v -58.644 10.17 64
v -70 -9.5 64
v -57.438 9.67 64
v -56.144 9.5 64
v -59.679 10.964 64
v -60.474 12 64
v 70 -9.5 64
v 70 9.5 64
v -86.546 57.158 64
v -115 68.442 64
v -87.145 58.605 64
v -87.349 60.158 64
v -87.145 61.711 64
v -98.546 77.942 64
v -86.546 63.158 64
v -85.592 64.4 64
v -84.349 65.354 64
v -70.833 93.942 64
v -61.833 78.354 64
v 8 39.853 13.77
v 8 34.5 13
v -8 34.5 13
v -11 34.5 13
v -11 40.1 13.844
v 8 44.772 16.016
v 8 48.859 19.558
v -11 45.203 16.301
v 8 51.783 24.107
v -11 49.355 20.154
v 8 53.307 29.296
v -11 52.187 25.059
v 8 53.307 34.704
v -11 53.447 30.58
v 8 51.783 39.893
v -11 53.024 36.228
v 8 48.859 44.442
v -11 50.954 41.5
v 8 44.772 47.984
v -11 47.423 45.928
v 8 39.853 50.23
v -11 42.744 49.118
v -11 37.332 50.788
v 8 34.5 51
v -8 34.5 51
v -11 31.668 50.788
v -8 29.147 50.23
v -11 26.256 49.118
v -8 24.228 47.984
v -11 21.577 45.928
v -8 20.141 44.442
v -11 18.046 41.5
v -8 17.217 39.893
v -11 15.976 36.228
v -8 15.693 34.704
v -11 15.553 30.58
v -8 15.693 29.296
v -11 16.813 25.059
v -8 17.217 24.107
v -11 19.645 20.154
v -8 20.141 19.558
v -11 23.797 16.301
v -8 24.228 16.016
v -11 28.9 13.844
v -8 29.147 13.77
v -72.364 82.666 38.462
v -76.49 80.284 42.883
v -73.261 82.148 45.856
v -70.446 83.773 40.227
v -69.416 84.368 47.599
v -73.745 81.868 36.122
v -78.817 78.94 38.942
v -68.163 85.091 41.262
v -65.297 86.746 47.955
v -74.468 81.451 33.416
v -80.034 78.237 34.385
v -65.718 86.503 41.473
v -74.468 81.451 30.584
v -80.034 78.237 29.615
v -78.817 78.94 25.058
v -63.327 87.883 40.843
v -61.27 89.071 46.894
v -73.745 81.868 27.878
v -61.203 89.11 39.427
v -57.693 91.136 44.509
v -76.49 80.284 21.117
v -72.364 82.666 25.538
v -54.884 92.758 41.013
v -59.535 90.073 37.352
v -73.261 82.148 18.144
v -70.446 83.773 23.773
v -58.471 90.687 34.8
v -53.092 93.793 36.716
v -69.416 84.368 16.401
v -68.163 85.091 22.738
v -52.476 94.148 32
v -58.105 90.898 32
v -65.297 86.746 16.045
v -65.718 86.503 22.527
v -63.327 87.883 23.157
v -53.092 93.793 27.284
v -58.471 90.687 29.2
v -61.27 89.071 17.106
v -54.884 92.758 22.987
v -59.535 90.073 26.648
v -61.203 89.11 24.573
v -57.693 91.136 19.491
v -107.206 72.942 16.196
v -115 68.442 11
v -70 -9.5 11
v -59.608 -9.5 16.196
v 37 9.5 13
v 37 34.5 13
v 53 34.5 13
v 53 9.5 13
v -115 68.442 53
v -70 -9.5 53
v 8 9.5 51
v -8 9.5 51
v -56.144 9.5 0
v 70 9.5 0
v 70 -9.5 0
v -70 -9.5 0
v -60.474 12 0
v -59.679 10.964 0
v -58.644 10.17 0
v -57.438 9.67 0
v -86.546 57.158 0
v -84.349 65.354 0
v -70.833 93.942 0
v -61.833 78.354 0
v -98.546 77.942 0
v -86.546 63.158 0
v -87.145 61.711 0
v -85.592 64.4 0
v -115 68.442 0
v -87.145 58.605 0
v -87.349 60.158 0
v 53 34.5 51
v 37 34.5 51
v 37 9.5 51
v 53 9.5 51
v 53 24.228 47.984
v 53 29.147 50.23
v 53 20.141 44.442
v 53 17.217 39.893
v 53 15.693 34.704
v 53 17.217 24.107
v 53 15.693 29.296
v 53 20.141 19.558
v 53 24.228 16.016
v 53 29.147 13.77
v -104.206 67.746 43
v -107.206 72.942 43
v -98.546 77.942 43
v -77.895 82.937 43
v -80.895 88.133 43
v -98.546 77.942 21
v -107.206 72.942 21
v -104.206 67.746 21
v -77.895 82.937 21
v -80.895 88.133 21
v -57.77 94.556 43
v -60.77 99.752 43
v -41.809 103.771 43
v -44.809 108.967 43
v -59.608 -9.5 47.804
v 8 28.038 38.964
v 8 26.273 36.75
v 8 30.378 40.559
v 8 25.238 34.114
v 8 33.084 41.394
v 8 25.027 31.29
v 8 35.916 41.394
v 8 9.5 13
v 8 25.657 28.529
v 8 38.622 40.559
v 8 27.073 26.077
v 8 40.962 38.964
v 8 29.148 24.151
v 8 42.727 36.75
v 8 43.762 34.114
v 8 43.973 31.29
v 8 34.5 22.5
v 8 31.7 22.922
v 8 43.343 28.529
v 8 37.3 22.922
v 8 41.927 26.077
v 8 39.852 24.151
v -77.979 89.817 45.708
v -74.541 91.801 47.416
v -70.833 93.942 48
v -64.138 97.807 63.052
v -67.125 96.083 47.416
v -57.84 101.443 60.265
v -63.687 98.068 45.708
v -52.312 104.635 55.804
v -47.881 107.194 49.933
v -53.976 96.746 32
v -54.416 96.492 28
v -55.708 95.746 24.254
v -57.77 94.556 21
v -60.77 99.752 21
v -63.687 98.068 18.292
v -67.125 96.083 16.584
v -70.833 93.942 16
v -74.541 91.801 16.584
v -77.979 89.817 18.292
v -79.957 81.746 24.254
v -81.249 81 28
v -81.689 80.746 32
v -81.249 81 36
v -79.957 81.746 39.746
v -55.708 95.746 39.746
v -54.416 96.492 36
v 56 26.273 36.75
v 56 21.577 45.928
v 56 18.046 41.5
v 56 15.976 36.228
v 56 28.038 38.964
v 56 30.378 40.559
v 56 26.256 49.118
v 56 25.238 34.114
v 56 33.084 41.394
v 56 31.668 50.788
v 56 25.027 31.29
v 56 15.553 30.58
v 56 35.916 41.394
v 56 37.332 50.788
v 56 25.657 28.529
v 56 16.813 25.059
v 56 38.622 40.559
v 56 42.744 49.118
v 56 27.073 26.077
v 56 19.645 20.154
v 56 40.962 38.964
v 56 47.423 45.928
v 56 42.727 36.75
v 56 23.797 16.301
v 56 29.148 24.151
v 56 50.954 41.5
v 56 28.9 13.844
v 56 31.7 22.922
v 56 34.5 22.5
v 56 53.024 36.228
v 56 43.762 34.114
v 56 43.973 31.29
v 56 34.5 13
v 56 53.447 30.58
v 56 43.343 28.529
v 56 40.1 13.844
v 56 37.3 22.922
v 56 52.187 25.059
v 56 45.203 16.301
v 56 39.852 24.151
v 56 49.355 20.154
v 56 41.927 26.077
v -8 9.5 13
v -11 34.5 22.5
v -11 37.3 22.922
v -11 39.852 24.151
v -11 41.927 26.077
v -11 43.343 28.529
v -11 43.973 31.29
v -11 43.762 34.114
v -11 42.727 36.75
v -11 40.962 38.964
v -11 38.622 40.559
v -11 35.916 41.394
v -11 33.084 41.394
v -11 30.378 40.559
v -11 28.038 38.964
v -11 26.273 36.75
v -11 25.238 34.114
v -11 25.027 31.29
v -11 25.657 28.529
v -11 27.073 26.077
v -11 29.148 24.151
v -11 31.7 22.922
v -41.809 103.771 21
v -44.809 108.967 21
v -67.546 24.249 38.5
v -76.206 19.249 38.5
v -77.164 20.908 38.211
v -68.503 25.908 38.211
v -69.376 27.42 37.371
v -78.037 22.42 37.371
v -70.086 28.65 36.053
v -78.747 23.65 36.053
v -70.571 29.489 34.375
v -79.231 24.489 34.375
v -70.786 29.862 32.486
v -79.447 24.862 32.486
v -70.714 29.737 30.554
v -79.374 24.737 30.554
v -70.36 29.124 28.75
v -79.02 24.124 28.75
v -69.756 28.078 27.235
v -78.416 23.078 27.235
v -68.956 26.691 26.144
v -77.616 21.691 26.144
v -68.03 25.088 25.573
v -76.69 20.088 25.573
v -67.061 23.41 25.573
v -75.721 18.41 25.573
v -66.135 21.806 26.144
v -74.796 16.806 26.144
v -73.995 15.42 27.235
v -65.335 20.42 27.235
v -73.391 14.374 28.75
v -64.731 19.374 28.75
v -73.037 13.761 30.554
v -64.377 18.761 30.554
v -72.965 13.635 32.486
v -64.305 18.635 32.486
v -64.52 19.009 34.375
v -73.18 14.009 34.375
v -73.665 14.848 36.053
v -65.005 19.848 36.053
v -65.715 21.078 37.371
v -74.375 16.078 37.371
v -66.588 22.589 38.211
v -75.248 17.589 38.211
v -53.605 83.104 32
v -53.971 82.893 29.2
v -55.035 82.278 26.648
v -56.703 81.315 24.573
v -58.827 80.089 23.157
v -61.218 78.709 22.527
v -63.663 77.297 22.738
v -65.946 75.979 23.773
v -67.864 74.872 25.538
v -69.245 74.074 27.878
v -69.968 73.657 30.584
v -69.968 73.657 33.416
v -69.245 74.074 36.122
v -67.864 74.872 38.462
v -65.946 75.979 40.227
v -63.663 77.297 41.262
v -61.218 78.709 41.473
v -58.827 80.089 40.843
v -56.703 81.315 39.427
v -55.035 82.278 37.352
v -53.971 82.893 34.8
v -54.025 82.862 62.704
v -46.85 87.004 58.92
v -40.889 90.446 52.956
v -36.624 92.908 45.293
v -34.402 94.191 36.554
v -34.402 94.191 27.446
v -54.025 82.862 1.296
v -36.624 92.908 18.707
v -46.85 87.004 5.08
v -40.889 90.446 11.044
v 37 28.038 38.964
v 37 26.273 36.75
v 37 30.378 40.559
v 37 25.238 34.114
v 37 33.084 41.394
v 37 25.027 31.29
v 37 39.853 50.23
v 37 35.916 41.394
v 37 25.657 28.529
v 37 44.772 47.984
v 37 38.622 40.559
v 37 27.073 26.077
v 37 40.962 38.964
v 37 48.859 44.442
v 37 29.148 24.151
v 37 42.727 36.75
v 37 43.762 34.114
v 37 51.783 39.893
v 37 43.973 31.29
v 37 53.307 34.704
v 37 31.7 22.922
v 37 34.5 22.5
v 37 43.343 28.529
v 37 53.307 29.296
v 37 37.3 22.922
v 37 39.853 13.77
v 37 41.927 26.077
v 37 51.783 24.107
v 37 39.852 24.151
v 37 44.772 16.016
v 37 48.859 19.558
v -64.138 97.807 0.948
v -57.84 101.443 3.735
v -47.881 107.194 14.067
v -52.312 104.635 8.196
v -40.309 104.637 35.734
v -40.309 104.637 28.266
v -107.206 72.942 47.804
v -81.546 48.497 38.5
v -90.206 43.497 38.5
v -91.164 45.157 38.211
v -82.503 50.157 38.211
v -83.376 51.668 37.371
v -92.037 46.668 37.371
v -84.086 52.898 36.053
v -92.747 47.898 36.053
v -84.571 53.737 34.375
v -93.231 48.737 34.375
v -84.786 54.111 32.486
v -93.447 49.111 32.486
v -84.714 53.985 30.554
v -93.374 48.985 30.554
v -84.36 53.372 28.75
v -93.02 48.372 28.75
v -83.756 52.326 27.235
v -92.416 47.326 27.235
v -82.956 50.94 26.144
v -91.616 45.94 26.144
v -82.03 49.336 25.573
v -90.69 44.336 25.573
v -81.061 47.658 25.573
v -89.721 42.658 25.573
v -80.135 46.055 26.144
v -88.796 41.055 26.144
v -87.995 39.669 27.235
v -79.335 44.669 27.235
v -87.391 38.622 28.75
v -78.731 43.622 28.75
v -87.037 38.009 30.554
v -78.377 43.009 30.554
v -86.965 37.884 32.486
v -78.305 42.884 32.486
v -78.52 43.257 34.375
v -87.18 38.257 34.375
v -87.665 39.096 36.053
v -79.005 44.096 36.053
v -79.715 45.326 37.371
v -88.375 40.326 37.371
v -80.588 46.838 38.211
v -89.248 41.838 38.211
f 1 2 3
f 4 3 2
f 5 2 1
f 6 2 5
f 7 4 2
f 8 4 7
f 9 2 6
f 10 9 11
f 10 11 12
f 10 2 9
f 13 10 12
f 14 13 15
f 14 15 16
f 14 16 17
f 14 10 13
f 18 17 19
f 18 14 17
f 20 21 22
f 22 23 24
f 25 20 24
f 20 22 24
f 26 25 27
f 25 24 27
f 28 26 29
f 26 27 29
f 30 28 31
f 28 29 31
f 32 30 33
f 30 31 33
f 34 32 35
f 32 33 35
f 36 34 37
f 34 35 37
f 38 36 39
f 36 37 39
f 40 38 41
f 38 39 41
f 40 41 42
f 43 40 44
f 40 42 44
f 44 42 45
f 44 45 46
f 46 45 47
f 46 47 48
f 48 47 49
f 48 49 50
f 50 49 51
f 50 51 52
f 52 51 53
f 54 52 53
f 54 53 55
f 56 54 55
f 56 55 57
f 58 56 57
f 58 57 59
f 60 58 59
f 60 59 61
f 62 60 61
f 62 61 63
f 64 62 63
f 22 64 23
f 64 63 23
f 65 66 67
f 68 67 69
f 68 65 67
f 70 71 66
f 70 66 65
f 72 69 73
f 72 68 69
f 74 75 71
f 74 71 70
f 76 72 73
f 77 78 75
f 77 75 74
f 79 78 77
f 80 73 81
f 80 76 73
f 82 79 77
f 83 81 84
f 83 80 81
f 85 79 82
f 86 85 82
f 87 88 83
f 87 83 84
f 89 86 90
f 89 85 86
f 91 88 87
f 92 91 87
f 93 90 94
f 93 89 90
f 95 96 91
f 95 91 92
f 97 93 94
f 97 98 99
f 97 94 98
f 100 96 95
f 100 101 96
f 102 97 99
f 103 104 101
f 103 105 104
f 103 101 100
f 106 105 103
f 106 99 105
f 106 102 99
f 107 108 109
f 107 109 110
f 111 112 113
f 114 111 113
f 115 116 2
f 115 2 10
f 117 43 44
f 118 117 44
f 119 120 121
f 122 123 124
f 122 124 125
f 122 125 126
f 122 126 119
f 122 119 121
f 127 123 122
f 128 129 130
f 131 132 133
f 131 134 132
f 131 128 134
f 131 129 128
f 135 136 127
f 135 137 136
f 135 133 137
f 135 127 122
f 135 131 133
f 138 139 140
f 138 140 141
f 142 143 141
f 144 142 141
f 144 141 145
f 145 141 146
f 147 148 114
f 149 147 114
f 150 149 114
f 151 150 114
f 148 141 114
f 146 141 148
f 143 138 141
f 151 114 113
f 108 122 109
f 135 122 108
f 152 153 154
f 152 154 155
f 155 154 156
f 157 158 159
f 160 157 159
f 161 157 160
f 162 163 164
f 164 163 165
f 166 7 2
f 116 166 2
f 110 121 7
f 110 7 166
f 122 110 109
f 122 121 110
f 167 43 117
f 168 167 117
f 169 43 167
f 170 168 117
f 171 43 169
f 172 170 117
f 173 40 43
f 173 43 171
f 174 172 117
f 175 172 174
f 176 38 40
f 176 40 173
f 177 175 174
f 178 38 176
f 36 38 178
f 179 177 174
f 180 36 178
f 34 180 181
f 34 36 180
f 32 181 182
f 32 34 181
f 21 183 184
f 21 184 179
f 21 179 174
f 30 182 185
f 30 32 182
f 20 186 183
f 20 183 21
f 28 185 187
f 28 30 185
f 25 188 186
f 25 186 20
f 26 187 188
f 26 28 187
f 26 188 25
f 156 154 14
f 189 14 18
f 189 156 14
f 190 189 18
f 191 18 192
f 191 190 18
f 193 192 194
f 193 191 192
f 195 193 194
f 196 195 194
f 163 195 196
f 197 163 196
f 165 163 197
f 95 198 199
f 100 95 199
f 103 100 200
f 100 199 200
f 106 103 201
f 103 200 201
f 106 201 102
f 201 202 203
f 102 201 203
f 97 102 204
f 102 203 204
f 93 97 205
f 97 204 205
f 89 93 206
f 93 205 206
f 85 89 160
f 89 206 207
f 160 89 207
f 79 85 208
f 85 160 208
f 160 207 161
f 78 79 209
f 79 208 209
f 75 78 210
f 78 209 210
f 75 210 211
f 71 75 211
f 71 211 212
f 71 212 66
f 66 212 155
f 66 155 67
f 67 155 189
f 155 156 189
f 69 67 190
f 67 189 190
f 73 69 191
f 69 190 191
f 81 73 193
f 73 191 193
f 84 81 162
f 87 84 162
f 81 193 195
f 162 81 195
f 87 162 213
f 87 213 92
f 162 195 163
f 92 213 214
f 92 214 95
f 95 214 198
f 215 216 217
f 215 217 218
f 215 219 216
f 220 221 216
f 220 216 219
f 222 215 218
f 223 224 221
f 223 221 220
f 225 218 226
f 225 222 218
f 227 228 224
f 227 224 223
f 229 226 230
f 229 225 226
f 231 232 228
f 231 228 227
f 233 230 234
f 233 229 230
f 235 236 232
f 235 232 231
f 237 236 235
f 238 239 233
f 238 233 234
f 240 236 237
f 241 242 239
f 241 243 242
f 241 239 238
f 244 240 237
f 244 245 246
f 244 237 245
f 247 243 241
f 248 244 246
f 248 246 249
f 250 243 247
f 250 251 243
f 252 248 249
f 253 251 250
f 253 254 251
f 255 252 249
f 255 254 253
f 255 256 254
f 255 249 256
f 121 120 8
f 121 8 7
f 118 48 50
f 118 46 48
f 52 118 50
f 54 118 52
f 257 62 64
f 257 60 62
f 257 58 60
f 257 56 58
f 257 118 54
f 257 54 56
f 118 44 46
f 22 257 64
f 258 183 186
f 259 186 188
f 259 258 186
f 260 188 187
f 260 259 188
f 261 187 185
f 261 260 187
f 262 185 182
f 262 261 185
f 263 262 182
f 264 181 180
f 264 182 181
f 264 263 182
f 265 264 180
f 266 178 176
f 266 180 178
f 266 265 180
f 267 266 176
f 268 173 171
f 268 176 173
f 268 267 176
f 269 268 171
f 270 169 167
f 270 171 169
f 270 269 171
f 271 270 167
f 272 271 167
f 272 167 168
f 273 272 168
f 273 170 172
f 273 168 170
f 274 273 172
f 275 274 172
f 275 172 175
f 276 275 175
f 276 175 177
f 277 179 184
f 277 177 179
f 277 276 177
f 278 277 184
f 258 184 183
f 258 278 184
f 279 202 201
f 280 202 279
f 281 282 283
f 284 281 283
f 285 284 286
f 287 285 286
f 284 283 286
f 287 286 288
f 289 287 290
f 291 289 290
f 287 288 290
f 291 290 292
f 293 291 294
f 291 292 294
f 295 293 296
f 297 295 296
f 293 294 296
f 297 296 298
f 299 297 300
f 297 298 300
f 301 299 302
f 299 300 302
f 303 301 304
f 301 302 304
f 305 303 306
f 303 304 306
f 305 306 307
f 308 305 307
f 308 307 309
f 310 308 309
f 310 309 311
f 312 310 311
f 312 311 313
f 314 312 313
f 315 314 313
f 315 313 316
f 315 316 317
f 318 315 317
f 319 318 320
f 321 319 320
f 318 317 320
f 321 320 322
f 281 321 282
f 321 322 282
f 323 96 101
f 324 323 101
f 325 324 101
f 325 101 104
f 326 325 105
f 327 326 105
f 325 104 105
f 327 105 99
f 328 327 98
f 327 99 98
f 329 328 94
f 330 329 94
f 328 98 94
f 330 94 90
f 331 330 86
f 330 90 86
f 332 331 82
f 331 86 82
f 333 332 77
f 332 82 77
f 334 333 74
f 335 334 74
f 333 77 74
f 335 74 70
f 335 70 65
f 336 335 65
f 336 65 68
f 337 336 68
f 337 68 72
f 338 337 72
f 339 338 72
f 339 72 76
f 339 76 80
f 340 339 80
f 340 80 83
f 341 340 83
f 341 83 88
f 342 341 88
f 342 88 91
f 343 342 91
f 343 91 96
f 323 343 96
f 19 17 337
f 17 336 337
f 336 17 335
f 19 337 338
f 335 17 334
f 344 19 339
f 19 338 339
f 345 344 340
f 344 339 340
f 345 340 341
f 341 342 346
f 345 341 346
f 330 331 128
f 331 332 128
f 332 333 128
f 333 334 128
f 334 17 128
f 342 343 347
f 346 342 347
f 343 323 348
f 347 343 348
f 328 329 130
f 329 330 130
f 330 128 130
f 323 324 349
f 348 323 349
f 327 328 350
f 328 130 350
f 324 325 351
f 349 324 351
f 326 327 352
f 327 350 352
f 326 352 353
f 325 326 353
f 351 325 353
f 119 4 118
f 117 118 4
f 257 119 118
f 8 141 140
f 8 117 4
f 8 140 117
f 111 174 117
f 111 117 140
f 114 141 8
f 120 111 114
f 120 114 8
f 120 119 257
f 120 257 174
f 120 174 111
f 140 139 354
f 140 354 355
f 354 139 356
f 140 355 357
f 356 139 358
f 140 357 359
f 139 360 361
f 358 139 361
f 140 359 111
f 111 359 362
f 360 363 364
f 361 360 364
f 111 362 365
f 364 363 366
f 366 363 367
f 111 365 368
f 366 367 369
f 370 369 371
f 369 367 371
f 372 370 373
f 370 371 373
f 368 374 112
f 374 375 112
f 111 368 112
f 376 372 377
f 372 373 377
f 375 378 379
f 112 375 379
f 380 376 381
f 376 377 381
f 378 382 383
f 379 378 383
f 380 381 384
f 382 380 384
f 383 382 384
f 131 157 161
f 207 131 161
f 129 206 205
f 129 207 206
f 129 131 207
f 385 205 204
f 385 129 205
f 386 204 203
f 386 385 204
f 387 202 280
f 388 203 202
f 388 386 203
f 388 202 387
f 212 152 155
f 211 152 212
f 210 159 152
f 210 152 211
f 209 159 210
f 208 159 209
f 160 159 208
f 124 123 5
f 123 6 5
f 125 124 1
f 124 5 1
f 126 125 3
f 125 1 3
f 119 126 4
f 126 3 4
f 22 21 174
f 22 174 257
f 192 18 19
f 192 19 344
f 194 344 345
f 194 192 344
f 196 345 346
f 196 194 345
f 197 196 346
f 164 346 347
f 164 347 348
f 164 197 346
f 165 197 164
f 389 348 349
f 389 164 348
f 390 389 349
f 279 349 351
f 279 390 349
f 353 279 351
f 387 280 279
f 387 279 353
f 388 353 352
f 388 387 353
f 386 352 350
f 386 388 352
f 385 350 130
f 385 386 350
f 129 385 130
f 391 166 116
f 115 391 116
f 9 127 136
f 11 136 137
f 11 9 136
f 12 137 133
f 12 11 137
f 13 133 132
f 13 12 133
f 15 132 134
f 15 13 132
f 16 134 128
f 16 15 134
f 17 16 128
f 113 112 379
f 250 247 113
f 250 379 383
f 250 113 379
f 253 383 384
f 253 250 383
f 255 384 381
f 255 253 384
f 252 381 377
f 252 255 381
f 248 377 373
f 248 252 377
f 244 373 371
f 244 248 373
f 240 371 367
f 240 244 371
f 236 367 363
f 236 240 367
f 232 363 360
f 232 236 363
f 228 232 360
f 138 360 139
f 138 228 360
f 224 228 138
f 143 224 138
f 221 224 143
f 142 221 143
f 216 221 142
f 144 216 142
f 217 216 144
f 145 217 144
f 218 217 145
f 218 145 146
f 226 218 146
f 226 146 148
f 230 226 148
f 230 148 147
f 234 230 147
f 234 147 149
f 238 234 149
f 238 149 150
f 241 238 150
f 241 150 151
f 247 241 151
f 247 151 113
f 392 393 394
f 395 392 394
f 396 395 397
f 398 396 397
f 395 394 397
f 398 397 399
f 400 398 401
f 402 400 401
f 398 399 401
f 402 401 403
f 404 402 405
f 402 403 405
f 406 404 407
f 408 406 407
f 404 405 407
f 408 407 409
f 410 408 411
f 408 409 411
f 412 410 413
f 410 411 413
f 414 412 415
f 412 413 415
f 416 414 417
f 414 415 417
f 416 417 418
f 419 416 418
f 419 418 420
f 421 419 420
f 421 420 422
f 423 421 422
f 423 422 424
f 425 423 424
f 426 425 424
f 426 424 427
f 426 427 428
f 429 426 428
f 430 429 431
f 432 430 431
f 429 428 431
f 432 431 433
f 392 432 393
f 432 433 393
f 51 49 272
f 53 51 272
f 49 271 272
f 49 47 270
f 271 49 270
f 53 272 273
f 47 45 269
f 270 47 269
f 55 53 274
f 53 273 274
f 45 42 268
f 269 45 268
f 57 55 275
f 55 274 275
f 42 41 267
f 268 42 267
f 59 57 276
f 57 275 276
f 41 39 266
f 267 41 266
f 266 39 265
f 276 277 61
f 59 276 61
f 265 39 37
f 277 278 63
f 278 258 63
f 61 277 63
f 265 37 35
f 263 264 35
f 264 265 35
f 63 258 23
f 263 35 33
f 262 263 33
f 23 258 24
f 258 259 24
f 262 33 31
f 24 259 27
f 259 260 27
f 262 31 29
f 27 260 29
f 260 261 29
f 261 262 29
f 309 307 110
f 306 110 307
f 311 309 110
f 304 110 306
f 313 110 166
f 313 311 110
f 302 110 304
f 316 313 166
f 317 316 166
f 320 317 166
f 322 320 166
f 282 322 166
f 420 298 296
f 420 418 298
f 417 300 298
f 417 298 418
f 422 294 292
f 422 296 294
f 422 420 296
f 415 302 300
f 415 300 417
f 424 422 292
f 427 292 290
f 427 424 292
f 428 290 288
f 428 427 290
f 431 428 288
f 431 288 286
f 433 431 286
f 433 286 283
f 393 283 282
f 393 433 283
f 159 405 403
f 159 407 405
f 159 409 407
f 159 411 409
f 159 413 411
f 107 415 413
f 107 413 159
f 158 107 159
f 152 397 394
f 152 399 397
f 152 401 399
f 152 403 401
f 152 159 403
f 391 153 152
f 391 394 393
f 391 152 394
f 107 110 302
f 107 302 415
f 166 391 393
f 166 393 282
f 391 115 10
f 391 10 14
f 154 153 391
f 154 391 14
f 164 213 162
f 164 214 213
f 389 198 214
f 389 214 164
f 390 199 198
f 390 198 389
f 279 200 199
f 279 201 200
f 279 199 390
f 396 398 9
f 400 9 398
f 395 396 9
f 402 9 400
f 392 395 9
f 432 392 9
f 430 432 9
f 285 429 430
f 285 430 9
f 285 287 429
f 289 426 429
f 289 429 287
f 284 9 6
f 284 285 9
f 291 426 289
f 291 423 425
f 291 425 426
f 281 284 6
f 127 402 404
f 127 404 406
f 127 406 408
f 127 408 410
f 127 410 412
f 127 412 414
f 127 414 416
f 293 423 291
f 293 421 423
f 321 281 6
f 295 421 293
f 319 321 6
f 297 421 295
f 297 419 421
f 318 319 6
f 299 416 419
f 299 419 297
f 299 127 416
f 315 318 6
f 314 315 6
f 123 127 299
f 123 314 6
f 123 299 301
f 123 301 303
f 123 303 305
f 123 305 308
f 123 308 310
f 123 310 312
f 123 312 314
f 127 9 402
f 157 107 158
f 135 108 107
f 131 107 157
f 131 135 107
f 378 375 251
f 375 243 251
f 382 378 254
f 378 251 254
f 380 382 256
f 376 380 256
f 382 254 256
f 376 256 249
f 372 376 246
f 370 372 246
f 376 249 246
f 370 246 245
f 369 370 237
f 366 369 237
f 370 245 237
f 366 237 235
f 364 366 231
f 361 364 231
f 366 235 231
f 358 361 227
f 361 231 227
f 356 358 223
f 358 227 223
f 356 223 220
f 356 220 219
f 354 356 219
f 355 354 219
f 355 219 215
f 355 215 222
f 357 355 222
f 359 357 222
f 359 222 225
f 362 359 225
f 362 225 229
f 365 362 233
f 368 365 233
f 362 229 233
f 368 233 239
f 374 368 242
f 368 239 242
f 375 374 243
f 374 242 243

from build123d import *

# Parameters (mm, degrees)
BOSS_EXTRUDE1_DEPTH = 64
SKETCH2_R           = 9.5
BOSS_EXTRUDE3_DEPTH = 18
CUT_EXTRUDE1_DEPTH  = 128
SKETCH4_W           = 79.210461268
SKETCH4_H           = 22
CUT_EXTRUDE2_DEPTH  = 6
SKETCH5_R           = 16
CUT_EXTRUDE4_DEPTH  = 9
SKETCH6_R           = 6.5
CUT_EXTRUDE6_DEPTH  = 10
FILLET1_R           = 5
FILLET2_R           = 6
SKETCH7_W           = 16
SKETCH7_H           = 38
BOSS_EXTRUDE4_DEPTH = 25
SKETCH8_R           = 19
SKETCH8_R_2         = 9.5
BOSS_EXTRUDE5_DEPTH = 19
SKETCH9_R           = 9.5
CUT_EXTRUDE7_DEPTH  = 19
SKETCH11_R          = 9.5
CUT_EXTRUDE8_DEPTH  = 19


with BuildPart() as part:
    # Sketch1 → Boss-Extrude1 (new body)
    with BuildSketch(Plane.XY):
        Polygon((-70, -9.5), (-115, 68.442286341), (-98.545517328, 77.942286341), (-59.030344885, 9.5), (70, 9.5), (70, -9.5), align=None)
    extrude(amount=BOSS_EXTRUDE1_DEPTH)

    # Sketch2 → Boss-Extrude3 (add)
    with BuildSketch(Plane(origin=(-58.386379332, 101.128175473, 0), x_dir=(0.866025404, 0.5, 0), z_dir=(-0.5, 0.866025404, 0))):
        with BuildLine():
            Line((-46.371778265, 0), (-46.371778265, -64))
            Line((-46.371778265, -64), (-14.371778265, -64))
            ThreePointArc((-14.371778265, -64), (17.628221735, -32), (-14.371778265, 0))
            Line((-14.371778265, 0), (-46.371778265, 0))
        make_face()
        with Locations((-14.371778265, -32)):
            Circle(SKETCH2_R, mode=Mode.SUBTRACT)
    extrude(amount=-BOSS_EXTRUDE3_DEPTH)

    # Sketch3 → Cut-Extrude1 (cut)
    with BuildSketch(Plane(origin=(-58.386379332, 101.128175473, 0), x_dir=(0.866025404, 0.5, 0), z_dir=(-0.5, 0.866025404, 0))):
        Polygon((-56.371778265, -16.196152423), (-56.371778265, -47.803847577), (-65.371778265, -53), (-65.371778265, -11), align=None)
    extrude(amount=-CUT_EXTRUDE1_DEPTH, mode=Mode.SUBTRACT)

    # Sketch4 → Cut-Extrude2 (cut)
    with BuildSketch(Plane(origin=(-58.386379332, 101.128175473, 0), x_dir=(0.866025404, 0.5, 0), z_dir=(-0.5, 0.866025404, 0))):
        with Locations((-20.439118131, -32)):
            Rectangle(SKETCH4_W, SKETCH4_H)
    extrude(amount=-CUT_EXTRUDE2_DEPTH, mode=Mode.SUBTRACT)

    # Sketch5 → Cut-Extrude4 (cut)
    with BuildSketch(Plane(origin=(-58.386379332, 101.128175473, 0), x_dir=(0.866025404, 0.5, 0), z_dir=(-0.5, 0.866025404, 0))):
        with Locations((-14.371778265, -32)):
            Circle(SKETCH5_R)
    extrude(amount=-CUT_EXTRUDE4_DEPTH, mode=Mode.SUBTRACT)

    # Sketch6 → Cut-Extrude6 (cut)
    with BuildSketch(Plane(origin=(-48.819392034, -28.185889132, 0), x_dir=(0, 0, 1), z_dir=(-0.866025404, -0.5, 0))):
        with Locations((32, 82.772758664)):
            Circle(SKETCH6_R)
        with Locations((32, 54.772758664)):
            Circle(SKETCH6_R)
    extrude(amount=-CUT_EXTRUDE6_DEPTH, mode=Mode.SUBTRACT)

    # Fillet1
    fillet1_edges = [part.edges().sort_by_distance(p)[0] for p in [
        (-59.030344885, 9.5, 32),
    ]]
    fillet(fillet1_edges, radius=FILLET1_R)

    # Fillet2
    fillet2_edges = [part.edges().sort_by_distance(p)[0] for p in [
        (-89.545517328, 62.353829072, 32),
    ]]
    fillet(fillet2_edges, radius=FILLET2_R)

    # Sketch7 → Boss-Extrude4 (add)
    with BuildSketch(Plane(origin=(0, 9.5, 0), x_dir=(1, 0, 0), z_dir=(0, 1, 0))):
        with Locations((45, -32)):
            Rectangle(SKETCH7_W, SKETCH7_H)
    boss_extrude4 = extrude(amount=BOSS_EXTRUDE4_DEPTH)

    # Sketch8 → Boss-Extrude5 (add)
    with BuildSketch(Plane(origin=(56, 0, 0), x_dir=(0, 0, -1), z_dir=(1, 0, 0))):
        with Locations((-32, 34.5)):
            Circle(SKETCH8_R)
        with Locations((-32, 34.5)):
            Circle(SKETCH8_R_2, mode=Mode.SUBTRACT)
    boss_extrude5 = extrude(amount=-BOSS_EXTRUDE5_DEPTH)

    # Sketch9 → Cut-Extrude7 (cut)
    with BuildSketch(Plane(origin=(56, 0, 0), x_dir=(0, 0, -1), z_dir=(1, 0, 0))):
        with Locations((-32, 34.5)):
            Circle(SKETCH9_R)
    extrude(amount=-CUT_EXTRUDE7_DEPTH, mode=Mode.SUBTRACT)

    # Mirror1: Boss-Extrude4, Boss-Extrude5 across plane
    add(boss_extrude4.mirror(Plane(origin=(22.5, 0, 0), x_dir=(0, 0, 1), z_dir=(1, 0, 0))))
    add(boss_extrude5.mirror(Plane(origin=(22.5, 0, 0), x_dir=(0, 0, 1), z_dir=(1, 0, 0))))

    # Sketch11 → Cut-Extrude8 (cut)
    with BuildSketch(Plane.ZY.offset(11)):
        with Locations((32, 34.5)):
            Circle(SKETCH11_R)
    extrude(amount=-CUT_EXTRUDE8_DEPTH, mode=Mode.SUBTRACT)


solid = part.part
